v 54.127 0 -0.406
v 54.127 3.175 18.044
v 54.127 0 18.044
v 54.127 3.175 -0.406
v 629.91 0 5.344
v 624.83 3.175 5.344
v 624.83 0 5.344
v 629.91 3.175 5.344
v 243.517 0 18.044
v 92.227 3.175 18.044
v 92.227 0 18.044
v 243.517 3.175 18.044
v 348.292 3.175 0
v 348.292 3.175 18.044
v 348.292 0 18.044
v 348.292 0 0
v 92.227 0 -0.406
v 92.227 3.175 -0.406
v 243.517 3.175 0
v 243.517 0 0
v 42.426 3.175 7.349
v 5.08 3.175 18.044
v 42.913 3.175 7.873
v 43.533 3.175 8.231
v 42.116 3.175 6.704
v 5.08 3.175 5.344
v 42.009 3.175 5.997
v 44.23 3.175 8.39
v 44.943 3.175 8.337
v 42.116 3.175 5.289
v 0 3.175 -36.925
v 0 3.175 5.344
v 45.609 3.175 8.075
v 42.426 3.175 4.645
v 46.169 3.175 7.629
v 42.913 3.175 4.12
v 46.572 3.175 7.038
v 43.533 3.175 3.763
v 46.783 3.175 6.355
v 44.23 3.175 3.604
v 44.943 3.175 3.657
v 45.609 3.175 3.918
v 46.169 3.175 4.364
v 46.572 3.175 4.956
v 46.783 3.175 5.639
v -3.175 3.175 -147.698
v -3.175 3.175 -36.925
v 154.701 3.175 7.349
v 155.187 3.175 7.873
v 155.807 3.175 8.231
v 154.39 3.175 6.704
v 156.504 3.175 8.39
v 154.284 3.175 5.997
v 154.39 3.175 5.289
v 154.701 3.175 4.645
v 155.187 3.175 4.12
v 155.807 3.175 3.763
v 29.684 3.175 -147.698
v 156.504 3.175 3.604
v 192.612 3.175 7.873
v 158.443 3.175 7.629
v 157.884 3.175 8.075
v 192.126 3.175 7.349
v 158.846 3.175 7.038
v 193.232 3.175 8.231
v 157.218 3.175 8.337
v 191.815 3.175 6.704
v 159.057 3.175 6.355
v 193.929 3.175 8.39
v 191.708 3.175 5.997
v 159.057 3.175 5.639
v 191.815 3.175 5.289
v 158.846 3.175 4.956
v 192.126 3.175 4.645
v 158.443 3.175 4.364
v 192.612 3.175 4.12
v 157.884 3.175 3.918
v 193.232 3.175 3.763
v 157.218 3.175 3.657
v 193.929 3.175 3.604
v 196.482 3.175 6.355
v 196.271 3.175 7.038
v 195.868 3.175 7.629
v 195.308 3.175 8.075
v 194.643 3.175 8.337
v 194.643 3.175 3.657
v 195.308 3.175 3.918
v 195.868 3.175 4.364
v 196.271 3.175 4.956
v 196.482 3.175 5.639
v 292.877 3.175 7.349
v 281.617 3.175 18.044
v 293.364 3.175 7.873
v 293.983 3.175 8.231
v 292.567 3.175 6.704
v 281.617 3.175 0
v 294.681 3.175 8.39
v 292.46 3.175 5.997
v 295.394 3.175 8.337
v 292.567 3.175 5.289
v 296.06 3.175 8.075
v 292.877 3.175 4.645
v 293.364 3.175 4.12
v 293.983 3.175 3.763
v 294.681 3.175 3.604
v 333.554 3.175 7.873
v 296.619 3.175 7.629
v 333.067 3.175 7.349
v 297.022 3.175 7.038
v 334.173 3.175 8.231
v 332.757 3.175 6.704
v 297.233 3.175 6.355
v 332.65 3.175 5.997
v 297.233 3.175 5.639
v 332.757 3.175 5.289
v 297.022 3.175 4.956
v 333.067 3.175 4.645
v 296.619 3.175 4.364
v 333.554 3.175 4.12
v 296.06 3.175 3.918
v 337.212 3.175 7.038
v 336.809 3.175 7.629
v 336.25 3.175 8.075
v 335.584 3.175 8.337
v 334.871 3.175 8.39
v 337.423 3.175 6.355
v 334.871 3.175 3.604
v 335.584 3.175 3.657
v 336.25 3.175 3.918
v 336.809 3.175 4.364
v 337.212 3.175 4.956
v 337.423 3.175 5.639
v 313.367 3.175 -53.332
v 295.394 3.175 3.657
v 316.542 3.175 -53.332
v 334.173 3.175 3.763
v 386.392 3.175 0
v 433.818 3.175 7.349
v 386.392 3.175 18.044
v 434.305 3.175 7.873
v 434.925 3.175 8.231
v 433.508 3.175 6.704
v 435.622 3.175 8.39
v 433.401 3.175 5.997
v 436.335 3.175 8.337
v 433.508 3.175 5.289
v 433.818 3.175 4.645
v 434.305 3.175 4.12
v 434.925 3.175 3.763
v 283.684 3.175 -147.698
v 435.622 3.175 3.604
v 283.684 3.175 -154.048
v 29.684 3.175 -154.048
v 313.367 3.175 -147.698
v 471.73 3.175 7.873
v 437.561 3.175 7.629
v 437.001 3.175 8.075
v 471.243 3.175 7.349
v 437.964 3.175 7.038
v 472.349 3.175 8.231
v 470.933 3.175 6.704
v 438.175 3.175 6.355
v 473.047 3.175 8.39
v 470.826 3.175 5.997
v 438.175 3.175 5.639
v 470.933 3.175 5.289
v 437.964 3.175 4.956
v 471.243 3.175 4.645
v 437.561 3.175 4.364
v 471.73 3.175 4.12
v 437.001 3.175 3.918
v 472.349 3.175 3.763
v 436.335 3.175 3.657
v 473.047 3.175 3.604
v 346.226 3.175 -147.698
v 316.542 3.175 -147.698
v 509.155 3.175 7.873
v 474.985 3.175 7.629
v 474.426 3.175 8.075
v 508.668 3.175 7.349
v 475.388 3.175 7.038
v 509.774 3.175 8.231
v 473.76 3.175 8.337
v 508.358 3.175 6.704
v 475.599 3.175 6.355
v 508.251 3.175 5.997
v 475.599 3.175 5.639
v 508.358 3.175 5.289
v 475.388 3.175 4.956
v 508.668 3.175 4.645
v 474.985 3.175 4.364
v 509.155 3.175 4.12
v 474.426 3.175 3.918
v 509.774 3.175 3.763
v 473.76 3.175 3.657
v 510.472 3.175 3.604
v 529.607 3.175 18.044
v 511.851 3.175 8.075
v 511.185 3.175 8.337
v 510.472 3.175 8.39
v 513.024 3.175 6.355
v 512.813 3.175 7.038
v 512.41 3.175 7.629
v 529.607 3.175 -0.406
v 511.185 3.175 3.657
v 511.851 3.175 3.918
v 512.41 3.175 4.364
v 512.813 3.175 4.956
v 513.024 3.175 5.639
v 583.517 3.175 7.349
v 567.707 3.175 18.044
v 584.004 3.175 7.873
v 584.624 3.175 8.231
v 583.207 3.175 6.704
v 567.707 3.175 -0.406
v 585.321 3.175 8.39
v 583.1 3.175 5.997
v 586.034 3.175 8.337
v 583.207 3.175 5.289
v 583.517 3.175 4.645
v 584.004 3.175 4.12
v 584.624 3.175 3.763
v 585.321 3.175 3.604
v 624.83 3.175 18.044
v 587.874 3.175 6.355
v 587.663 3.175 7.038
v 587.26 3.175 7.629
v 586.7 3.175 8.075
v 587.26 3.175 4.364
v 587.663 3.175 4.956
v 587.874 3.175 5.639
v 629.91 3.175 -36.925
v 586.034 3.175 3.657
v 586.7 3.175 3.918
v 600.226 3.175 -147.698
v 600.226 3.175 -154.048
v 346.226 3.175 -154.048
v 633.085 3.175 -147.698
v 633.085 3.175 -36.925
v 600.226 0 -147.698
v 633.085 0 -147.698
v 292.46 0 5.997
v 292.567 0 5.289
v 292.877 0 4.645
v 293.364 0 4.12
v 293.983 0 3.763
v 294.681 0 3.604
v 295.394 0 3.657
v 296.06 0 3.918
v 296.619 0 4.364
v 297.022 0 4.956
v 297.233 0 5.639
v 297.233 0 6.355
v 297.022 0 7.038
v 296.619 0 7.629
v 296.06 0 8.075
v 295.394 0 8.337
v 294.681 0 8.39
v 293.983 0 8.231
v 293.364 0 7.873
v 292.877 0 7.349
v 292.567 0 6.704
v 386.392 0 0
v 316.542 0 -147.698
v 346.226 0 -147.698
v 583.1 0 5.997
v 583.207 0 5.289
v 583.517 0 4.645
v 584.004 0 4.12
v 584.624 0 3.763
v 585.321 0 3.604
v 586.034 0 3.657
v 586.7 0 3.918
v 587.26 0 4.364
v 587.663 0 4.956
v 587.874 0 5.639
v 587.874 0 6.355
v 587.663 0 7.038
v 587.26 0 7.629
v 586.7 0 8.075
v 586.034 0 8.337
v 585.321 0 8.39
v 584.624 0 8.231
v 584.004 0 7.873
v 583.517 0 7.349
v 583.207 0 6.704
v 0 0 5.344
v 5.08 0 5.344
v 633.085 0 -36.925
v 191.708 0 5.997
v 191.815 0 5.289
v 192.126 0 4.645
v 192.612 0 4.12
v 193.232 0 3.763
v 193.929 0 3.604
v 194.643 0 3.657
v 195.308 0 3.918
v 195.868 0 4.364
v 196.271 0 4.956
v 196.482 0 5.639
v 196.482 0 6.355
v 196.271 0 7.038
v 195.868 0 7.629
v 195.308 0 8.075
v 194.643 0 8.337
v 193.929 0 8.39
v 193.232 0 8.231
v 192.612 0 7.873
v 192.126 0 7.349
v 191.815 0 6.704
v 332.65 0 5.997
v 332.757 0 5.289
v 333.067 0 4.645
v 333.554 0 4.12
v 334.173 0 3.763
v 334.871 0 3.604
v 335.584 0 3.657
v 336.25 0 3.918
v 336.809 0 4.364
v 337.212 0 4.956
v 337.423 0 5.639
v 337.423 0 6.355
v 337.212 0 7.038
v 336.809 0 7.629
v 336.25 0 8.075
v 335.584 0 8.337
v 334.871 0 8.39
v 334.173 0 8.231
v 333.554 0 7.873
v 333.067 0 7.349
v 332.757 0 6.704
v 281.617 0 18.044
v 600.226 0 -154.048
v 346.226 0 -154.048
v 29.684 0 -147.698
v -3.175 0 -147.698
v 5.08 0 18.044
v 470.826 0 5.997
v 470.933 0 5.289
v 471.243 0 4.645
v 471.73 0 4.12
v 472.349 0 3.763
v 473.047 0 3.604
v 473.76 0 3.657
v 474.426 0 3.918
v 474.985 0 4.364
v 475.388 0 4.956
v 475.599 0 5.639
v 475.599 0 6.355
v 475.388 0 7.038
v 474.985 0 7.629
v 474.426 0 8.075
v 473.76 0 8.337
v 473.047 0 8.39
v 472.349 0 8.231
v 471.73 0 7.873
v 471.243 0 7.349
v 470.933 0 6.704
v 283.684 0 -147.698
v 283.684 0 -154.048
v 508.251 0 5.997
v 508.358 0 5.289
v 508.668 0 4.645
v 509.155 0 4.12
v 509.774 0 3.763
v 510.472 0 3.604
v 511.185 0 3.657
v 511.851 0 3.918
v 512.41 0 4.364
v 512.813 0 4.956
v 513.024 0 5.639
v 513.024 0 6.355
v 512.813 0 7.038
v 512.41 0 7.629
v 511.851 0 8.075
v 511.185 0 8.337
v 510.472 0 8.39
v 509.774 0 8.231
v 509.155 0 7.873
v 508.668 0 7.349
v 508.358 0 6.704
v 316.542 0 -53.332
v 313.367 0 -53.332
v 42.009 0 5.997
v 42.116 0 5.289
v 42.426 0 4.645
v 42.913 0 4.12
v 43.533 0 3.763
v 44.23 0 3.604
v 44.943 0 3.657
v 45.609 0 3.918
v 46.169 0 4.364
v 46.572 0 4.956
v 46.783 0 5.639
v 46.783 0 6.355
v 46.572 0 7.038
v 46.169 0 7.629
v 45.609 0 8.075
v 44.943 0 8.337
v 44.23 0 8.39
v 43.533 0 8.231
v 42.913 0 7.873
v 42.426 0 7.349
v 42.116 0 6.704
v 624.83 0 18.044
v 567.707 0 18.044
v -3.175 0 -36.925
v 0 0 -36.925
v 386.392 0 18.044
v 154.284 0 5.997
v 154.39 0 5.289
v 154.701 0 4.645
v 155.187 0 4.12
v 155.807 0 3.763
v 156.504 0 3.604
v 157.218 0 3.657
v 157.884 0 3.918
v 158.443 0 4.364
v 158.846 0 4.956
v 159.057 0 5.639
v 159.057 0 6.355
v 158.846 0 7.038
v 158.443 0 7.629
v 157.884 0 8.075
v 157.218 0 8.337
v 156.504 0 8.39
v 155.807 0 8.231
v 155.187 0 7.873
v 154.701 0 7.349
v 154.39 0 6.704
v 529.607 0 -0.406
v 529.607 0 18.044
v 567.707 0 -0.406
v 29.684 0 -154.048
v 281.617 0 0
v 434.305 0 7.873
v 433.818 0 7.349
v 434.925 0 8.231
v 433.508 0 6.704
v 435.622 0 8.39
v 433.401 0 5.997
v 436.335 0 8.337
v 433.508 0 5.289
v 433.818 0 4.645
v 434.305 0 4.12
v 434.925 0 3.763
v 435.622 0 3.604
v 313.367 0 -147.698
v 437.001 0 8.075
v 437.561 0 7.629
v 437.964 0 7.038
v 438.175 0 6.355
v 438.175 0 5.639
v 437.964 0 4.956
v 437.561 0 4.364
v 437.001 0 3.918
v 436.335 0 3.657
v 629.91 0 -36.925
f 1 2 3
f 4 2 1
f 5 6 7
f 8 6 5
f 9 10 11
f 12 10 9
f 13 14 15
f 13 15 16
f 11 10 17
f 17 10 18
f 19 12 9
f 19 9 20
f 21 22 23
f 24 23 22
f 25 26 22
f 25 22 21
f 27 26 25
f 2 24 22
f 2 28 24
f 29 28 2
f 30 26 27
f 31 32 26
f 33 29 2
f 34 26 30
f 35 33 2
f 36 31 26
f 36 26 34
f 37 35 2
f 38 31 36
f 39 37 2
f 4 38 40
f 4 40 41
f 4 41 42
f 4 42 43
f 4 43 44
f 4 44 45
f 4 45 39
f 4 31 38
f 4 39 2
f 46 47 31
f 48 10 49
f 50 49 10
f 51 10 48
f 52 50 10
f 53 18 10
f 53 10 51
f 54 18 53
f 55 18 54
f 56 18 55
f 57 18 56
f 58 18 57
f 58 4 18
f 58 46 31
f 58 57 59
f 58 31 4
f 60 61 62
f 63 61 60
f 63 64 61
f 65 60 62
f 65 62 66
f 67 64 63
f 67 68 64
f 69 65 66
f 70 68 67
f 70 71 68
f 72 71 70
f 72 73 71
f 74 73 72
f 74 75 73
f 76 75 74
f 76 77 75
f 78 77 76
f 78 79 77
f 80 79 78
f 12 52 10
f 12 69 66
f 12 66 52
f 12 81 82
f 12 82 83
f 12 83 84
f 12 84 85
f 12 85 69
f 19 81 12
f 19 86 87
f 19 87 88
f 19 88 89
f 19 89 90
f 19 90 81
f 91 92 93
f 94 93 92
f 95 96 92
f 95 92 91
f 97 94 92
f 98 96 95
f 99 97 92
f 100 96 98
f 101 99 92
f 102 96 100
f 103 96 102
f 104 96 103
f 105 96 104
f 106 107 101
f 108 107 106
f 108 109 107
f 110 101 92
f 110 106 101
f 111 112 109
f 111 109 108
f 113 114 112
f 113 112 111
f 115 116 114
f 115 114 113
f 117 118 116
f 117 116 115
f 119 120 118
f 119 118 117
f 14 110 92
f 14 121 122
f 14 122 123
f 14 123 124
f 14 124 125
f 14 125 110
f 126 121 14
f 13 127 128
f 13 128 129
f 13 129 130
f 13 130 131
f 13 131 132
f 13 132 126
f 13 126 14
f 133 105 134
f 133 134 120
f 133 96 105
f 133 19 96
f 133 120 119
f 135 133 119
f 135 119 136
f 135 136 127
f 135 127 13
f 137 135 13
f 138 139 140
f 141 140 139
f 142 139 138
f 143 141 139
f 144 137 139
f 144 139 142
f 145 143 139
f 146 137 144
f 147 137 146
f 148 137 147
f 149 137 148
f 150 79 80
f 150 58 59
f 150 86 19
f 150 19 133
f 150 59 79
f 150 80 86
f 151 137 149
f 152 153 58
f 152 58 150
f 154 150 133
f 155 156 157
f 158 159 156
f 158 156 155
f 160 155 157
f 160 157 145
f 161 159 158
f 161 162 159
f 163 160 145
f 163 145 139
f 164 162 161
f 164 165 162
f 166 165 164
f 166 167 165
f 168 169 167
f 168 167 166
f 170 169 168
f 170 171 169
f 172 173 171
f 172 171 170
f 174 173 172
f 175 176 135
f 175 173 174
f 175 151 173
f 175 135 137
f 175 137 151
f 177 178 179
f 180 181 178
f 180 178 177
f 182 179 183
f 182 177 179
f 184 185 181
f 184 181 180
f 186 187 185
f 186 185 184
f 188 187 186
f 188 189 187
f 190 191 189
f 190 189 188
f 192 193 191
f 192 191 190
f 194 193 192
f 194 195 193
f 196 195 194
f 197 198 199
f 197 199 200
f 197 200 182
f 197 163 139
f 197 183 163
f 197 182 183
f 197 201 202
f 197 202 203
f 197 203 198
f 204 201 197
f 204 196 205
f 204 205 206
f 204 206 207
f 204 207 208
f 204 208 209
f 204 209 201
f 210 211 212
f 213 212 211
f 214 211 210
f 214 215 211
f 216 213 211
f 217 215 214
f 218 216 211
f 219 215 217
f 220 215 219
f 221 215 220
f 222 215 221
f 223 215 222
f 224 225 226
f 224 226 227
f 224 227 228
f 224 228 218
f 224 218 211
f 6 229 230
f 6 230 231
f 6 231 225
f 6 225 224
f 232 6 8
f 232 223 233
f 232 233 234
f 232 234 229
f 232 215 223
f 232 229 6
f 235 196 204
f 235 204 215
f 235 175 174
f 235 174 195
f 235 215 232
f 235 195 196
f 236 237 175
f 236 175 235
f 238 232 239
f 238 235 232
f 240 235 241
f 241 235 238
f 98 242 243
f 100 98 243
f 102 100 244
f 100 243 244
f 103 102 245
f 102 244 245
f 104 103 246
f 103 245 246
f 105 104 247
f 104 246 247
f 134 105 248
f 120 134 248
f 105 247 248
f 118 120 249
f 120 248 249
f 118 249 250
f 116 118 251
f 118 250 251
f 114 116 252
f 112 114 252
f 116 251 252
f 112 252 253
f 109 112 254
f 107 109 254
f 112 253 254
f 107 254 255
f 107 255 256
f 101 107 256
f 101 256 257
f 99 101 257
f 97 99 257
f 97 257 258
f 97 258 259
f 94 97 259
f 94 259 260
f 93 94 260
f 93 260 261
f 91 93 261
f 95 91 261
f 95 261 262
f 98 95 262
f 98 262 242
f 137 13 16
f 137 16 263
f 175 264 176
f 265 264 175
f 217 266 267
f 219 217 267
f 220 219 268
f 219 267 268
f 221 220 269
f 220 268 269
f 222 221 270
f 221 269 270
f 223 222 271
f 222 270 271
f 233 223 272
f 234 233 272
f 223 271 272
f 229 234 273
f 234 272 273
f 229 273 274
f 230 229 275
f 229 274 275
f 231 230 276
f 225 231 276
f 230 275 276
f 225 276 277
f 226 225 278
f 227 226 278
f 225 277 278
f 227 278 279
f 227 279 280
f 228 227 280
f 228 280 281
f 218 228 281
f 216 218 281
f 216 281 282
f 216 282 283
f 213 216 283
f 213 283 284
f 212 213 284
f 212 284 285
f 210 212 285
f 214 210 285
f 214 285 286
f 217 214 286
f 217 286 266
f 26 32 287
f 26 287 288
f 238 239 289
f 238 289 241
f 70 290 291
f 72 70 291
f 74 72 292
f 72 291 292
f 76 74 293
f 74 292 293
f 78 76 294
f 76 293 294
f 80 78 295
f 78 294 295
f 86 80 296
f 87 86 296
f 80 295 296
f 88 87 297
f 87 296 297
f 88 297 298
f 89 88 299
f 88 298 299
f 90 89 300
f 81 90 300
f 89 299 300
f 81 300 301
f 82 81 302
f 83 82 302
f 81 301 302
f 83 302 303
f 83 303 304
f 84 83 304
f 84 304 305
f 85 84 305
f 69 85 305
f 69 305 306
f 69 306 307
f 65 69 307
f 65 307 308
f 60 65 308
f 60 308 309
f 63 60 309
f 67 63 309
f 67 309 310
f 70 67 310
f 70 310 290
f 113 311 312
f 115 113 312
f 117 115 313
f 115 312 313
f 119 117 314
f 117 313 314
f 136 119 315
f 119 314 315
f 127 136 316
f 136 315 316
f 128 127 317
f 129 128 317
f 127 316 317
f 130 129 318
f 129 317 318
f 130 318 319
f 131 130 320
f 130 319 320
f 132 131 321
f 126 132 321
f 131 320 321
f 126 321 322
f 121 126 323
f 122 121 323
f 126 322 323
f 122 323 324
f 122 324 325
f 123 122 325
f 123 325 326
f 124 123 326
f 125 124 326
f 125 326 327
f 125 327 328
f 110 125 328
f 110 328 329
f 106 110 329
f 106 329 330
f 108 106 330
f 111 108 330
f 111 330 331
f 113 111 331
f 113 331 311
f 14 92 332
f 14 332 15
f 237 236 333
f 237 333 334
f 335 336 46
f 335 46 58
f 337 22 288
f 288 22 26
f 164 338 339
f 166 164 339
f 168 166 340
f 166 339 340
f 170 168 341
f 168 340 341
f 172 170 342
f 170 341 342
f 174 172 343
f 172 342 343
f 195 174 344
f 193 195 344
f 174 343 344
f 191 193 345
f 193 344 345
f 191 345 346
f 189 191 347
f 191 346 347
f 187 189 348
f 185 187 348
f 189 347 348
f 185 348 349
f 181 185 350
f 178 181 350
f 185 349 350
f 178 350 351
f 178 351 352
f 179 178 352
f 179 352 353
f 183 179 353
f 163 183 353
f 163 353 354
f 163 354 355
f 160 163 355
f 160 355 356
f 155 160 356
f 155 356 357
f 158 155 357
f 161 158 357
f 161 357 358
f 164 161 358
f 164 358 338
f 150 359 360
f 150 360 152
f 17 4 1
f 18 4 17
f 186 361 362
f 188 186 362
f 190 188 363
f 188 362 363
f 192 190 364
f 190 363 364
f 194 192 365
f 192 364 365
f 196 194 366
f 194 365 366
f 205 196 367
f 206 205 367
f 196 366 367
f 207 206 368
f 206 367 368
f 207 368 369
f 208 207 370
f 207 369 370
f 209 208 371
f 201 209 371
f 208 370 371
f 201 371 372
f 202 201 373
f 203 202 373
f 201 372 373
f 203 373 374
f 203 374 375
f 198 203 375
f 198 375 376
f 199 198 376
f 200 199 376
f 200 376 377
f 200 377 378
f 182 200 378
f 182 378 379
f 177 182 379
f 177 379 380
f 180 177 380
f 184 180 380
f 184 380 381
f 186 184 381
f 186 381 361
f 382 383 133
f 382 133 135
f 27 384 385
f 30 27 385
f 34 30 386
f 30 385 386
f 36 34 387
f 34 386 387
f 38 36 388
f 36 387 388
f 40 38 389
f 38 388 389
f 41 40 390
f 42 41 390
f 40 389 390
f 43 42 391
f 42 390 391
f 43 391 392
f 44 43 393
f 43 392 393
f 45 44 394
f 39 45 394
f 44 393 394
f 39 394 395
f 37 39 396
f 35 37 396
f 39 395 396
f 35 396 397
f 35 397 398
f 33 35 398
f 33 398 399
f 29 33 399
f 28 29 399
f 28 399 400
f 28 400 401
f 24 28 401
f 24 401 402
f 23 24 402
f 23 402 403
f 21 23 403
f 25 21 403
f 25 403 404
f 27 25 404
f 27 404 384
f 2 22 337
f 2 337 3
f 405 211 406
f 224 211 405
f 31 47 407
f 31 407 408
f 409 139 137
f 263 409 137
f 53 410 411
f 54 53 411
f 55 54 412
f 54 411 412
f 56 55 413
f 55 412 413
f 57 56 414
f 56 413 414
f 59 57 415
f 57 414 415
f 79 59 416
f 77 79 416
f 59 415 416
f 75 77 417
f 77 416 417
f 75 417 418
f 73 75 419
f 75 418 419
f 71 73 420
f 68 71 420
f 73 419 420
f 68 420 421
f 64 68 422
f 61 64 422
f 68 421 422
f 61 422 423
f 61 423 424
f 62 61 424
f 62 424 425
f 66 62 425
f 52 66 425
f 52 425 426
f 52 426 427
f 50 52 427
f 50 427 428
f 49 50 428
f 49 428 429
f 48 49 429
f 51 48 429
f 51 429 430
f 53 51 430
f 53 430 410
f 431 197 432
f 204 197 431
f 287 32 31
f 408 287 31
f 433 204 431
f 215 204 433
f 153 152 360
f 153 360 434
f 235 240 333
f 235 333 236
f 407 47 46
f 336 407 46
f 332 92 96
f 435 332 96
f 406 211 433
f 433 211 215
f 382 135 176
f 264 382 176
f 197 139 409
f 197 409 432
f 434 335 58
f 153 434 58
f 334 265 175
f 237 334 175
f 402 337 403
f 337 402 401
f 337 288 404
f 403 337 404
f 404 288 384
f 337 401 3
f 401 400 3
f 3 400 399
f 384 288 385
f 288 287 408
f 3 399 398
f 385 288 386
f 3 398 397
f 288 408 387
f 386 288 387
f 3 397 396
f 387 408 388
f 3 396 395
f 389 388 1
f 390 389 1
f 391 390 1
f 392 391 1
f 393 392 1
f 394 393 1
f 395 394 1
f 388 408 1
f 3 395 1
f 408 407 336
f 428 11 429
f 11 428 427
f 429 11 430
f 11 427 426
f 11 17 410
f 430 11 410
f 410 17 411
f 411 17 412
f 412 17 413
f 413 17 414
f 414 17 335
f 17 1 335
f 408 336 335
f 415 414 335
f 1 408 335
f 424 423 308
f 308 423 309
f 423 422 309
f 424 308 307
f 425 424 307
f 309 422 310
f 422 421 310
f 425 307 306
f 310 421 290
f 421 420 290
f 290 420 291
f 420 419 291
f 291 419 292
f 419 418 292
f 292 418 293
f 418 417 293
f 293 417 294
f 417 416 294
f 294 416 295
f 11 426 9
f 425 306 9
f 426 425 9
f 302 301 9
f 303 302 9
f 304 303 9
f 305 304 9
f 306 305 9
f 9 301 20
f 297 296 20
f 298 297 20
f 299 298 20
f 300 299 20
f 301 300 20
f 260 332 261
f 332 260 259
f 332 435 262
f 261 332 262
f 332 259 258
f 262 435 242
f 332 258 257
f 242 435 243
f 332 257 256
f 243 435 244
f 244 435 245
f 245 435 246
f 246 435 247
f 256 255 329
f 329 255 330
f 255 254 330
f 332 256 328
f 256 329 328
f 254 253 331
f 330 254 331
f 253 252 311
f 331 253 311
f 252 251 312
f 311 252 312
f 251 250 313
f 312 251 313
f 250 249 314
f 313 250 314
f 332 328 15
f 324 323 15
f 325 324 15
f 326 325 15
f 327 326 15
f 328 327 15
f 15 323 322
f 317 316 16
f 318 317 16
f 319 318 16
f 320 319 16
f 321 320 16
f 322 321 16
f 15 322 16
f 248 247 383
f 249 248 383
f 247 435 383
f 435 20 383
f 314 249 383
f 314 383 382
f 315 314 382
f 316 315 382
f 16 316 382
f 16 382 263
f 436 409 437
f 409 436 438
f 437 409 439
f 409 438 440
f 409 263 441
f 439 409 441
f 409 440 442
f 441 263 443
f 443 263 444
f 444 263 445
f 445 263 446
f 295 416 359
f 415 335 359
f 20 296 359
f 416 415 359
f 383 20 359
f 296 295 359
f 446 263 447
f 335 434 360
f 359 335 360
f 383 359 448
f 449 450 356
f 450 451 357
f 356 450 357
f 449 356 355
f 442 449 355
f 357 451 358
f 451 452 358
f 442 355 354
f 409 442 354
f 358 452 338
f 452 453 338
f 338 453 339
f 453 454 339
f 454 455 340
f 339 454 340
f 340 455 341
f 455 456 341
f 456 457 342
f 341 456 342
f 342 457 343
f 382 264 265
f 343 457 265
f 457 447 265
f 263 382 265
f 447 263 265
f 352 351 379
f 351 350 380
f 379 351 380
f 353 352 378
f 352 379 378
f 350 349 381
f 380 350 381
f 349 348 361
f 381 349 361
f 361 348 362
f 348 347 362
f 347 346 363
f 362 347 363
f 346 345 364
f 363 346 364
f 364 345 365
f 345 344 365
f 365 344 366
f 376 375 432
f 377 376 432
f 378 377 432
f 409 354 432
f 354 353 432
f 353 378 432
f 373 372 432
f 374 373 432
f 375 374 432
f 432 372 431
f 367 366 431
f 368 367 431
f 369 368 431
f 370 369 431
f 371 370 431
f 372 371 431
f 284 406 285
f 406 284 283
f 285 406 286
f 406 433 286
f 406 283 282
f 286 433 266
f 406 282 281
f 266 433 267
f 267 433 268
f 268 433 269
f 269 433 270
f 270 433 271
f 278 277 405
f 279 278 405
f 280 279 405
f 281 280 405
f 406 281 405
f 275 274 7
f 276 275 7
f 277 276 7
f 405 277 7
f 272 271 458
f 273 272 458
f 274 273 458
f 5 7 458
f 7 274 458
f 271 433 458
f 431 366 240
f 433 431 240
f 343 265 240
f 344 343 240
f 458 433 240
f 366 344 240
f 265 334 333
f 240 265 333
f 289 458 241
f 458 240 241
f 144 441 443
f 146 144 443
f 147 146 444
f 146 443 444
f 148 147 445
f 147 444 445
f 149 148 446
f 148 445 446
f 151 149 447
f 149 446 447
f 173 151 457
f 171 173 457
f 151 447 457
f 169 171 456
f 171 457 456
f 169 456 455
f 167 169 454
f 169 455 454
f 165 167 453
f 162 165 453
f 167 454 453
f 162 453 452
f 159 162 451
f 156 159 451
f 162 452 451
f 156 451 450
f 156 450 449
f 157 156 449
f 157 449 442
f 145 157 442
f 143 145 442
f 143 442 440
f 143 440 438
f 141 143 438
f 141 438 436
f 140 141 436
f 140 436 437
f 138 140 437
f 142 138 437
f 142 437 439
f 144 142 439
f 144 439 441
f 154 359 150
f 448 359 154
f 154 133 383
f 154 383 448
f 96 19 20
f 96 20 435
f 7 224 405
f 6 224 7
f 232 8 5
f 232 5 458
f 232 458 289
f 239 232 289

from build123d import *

# Parameters (mm, degrees)
SKETCH1_W            = 629.90984
SKETCH1_H            = 147.69846
BOSS_EXTRUDE1_DEPTH  = 3.175
SKETCH3_W            = 254
SKETCH3_H            = 3.175
BOSS_EXTRUDE2_DEPTH  = 6.35
SKETCH4_W            = 3.175
SKETCH4_H            = 188.732840052
CUT_EXTRUDE1_DEPTH   = 3.175
SKETCH6_W            = 3.175
SKETCH6_H            = 110.773845
BOSS_EXTRUDE4_DEPTH  = 3.175
SKETCH8_W            = 629.90984
SKETCH8_H            = 18.04416
BOSS_EXTRUDE5_DEPTH  = 3.175
SKETCH10_W           = 38.1
SKETCH10_H           = 36.08832
CUT_EXTRUDE3_DEPTH   = 652.56536379
SKETCH12_W           = 38.1
SKETCH12_H           = 18.04416
BOSS_EXTRUDE7_DEPTH  = 3.175
SKETCH17_W           = 38.1
SKETCH17_H           = 18.04416
CUT_EXTRUDE5_DEPTH   = 652.56536379
SKETCH18_W           = 38.1
SKETCH18_H           = 18.450049938
CUT_EXTRUDE6_DEPTH   = 652.56536379
SKETCH24_W           = 5.08
SKETCH24_H           = 12.7
CUT_EXTRUDE11_DEPTH  = 652.56536379
M4_CLEARANCE_HOLE3_D = 4.8


with BuildPart() as part:
    # Sketch1 → Boss-Extrude1 (new body)
    with BuildSketch(Plane(origin=(0, 0, 0), x_dir=(1, 0, 0), z_dir=(0, 1, 0))):
        with Locations((314.95492, 73.84923)):
            Rectangle(SKETCH1_W, SKETCH1_H)
    extrude(amount=BOSS_EXTRUDE1_DEPTH)

    # Sketch3 → Boss-Extrude2 (add)
    with BuildSketch(Plane(origin=(0, 0, -147.69846), x_dir=(-1, 0, 0), z_dir=(0, 0, -1))):
        with Locations((-473.22613, 1.5875)):
            Rectangle(SKETCH3_W, SKETCH3_H)
        with Locations((-156.68371, 1.5875)):
            Rectangle(SKETCH3_W, SKETCH3_H)
    extrude(amount=BOSS_EXTRUDE2_DEPTH)

    # Sketch4 → Cut-Extrude1 (cut)
    with BuildSketch(Plane(origin=(0, 3.175, 0), x_dir=(1, 0, 0), z_dir=(0, 1, 0))):
        with Locations((314.95492, 147.69846)):
            Rectangle(SKETCH4_W, SKETCH4_H)
    extrude(amount=-CUT_EXTRUDE1_DEPTH, mode=Mode.SUBTRACT)

    # Sketch6 → Boss-Extrude4 (add)
    with BuildSketch(Plane(origin=(0, 3.175, 0), x_dir=(1, 0, 0), z_dir=(0, 1, 0))):
        with Locations((631.49734, 92.3115375)):
            Rectangle(SKETCH6_W, SKETCH6_H)
        with Locations((-1.5875, 92.3115375)):
            Rectangle(SKETCH6_W, SKETCH6_H)
    extrude(amount=-BOSS_EXTRUDE4_DEPTH)

    # Sketch8 → Boss-Extrude5 (add, through all)
    with BuildSketch(Plane(origin=(0, 3.175, 0), x_dir=(1, 0, 0), z_dir=(0, 1, 0))):
        with Locations((314.95492, -9.02208)):
            Rectangle(SKETCH8_W, SKETCH8_H)
    extrude(amount=-BOSS_EXTRUDE5_DEPTH)

    # Sketch10 → Cut-Extrude3 (cut, through all)
    with BuildSketch(Plane(origin=(0, 3.175, 0), x_dir=(1, 0, 0), z_dir=(0, 1, 0))):
        with Locations((579.10984, -18.04416)):
            Rectangle(SKETCH10_W, SKETCH10_H)
        with Locations((50.8, -18.04416)):
            Rectangle(SKETCH10_W, SKETCH10_H)
    extrude(amount=-CUT_EXTRUDE3_DEPTH, mode=Mode.SUBTRACT)

    # Sketch12 → Boss-Extrude7 (add, through all)
    with BuildSketch(Plane(origin=(0, 3.175, 0), x_dir=(1, 0, 0), z_dir=(0, 1, 0))):
        with Locations((50.8, -9.02208)):
            Rectangle(SKETCH12_W, SKETCH12_H)
        with Locations((579.10984, -9.02208)):
            Rectangle(SKETCH12_W, SKETCH12_H)
    extrude(amount=-BOSS_EXTRUDE7_DEPTH)

    # Sketch17 → Cut-Extrude5 (cut, through all)
    with BuildSketch(Plane(origin=(0, 3.175, 0), x_dir=(1, 0, 0), z_dir=(0, 1, 0))):
        with Locations((262.56742, -9.02208)):
            Rectangle(SKETCH17_W, SKETCH17_H)
        with Locations((367.34242, -9.02208)):
            Rectangle(SKETCH17_W, SKETCH17_H)
    extrude(amount=-CUT_EXTRUDE5_DEPTH, mode=Mode.SUBTRACT)

    # Sketch18 → Cut-Extrude6 (cut, through all)
    with BuildSketch(Plane(origin=(0, 3.175, 0), x_dir=(1, 0, 0), z_dir=(0, 1, 0))):
        with Locations((73.1774, -8.819135031)):
            Rectangle(SKETCH18_W, SKETCH18_H)
        with Locations((548.657320006, -8.819135031)):
            Rectangle(SKETCH18_W, SKETCH18_H)
    extrude(amount=-CUT_EXTRUDE6_DEPTH, mode=Mode.SUBTRACT)

    # Sketch24 → Cut-Extrude11 (cut, through all)
    with BuildSketch(Plane(origin=(0, 3.175, 0), x_dir=(1, 0, 0), z_dir=(0, 1, 0))):
        with Locations((2.54, -11.69416)):
            Rectangle(SKETCH24_W, SKETCH24_H)
        with Locations((627.36984, -11.69416)):
            Rectangle(SKETCH24_W, SKETCH24_H)
    extrude(amount=-CUT_EXTRUDE11_DEPTH, mode=Mode.SUBTRACT)

    # M4 Clearance Hole3 (through all)
    with Locations(Plane(origin=(0, 3.175, 0), x_dir=(1, 0, 0), z_dir=(0, 1, 0))):
        with Locations((44.409412743, -5.996840051), (156.68371, -5.996840051), (194.108475752, -5.996840051), (294.859886505, -5.996840051), (335.049953495, -5.996840051), (435.801364248, -5.996840051), (473.22613, -5.996840051), (510.650895752, -5.996840051), (585.500427257, -5.996840051)):
            Hole(M4_CLEARANCE_HOLE3_D / 2)


solid = part.part
